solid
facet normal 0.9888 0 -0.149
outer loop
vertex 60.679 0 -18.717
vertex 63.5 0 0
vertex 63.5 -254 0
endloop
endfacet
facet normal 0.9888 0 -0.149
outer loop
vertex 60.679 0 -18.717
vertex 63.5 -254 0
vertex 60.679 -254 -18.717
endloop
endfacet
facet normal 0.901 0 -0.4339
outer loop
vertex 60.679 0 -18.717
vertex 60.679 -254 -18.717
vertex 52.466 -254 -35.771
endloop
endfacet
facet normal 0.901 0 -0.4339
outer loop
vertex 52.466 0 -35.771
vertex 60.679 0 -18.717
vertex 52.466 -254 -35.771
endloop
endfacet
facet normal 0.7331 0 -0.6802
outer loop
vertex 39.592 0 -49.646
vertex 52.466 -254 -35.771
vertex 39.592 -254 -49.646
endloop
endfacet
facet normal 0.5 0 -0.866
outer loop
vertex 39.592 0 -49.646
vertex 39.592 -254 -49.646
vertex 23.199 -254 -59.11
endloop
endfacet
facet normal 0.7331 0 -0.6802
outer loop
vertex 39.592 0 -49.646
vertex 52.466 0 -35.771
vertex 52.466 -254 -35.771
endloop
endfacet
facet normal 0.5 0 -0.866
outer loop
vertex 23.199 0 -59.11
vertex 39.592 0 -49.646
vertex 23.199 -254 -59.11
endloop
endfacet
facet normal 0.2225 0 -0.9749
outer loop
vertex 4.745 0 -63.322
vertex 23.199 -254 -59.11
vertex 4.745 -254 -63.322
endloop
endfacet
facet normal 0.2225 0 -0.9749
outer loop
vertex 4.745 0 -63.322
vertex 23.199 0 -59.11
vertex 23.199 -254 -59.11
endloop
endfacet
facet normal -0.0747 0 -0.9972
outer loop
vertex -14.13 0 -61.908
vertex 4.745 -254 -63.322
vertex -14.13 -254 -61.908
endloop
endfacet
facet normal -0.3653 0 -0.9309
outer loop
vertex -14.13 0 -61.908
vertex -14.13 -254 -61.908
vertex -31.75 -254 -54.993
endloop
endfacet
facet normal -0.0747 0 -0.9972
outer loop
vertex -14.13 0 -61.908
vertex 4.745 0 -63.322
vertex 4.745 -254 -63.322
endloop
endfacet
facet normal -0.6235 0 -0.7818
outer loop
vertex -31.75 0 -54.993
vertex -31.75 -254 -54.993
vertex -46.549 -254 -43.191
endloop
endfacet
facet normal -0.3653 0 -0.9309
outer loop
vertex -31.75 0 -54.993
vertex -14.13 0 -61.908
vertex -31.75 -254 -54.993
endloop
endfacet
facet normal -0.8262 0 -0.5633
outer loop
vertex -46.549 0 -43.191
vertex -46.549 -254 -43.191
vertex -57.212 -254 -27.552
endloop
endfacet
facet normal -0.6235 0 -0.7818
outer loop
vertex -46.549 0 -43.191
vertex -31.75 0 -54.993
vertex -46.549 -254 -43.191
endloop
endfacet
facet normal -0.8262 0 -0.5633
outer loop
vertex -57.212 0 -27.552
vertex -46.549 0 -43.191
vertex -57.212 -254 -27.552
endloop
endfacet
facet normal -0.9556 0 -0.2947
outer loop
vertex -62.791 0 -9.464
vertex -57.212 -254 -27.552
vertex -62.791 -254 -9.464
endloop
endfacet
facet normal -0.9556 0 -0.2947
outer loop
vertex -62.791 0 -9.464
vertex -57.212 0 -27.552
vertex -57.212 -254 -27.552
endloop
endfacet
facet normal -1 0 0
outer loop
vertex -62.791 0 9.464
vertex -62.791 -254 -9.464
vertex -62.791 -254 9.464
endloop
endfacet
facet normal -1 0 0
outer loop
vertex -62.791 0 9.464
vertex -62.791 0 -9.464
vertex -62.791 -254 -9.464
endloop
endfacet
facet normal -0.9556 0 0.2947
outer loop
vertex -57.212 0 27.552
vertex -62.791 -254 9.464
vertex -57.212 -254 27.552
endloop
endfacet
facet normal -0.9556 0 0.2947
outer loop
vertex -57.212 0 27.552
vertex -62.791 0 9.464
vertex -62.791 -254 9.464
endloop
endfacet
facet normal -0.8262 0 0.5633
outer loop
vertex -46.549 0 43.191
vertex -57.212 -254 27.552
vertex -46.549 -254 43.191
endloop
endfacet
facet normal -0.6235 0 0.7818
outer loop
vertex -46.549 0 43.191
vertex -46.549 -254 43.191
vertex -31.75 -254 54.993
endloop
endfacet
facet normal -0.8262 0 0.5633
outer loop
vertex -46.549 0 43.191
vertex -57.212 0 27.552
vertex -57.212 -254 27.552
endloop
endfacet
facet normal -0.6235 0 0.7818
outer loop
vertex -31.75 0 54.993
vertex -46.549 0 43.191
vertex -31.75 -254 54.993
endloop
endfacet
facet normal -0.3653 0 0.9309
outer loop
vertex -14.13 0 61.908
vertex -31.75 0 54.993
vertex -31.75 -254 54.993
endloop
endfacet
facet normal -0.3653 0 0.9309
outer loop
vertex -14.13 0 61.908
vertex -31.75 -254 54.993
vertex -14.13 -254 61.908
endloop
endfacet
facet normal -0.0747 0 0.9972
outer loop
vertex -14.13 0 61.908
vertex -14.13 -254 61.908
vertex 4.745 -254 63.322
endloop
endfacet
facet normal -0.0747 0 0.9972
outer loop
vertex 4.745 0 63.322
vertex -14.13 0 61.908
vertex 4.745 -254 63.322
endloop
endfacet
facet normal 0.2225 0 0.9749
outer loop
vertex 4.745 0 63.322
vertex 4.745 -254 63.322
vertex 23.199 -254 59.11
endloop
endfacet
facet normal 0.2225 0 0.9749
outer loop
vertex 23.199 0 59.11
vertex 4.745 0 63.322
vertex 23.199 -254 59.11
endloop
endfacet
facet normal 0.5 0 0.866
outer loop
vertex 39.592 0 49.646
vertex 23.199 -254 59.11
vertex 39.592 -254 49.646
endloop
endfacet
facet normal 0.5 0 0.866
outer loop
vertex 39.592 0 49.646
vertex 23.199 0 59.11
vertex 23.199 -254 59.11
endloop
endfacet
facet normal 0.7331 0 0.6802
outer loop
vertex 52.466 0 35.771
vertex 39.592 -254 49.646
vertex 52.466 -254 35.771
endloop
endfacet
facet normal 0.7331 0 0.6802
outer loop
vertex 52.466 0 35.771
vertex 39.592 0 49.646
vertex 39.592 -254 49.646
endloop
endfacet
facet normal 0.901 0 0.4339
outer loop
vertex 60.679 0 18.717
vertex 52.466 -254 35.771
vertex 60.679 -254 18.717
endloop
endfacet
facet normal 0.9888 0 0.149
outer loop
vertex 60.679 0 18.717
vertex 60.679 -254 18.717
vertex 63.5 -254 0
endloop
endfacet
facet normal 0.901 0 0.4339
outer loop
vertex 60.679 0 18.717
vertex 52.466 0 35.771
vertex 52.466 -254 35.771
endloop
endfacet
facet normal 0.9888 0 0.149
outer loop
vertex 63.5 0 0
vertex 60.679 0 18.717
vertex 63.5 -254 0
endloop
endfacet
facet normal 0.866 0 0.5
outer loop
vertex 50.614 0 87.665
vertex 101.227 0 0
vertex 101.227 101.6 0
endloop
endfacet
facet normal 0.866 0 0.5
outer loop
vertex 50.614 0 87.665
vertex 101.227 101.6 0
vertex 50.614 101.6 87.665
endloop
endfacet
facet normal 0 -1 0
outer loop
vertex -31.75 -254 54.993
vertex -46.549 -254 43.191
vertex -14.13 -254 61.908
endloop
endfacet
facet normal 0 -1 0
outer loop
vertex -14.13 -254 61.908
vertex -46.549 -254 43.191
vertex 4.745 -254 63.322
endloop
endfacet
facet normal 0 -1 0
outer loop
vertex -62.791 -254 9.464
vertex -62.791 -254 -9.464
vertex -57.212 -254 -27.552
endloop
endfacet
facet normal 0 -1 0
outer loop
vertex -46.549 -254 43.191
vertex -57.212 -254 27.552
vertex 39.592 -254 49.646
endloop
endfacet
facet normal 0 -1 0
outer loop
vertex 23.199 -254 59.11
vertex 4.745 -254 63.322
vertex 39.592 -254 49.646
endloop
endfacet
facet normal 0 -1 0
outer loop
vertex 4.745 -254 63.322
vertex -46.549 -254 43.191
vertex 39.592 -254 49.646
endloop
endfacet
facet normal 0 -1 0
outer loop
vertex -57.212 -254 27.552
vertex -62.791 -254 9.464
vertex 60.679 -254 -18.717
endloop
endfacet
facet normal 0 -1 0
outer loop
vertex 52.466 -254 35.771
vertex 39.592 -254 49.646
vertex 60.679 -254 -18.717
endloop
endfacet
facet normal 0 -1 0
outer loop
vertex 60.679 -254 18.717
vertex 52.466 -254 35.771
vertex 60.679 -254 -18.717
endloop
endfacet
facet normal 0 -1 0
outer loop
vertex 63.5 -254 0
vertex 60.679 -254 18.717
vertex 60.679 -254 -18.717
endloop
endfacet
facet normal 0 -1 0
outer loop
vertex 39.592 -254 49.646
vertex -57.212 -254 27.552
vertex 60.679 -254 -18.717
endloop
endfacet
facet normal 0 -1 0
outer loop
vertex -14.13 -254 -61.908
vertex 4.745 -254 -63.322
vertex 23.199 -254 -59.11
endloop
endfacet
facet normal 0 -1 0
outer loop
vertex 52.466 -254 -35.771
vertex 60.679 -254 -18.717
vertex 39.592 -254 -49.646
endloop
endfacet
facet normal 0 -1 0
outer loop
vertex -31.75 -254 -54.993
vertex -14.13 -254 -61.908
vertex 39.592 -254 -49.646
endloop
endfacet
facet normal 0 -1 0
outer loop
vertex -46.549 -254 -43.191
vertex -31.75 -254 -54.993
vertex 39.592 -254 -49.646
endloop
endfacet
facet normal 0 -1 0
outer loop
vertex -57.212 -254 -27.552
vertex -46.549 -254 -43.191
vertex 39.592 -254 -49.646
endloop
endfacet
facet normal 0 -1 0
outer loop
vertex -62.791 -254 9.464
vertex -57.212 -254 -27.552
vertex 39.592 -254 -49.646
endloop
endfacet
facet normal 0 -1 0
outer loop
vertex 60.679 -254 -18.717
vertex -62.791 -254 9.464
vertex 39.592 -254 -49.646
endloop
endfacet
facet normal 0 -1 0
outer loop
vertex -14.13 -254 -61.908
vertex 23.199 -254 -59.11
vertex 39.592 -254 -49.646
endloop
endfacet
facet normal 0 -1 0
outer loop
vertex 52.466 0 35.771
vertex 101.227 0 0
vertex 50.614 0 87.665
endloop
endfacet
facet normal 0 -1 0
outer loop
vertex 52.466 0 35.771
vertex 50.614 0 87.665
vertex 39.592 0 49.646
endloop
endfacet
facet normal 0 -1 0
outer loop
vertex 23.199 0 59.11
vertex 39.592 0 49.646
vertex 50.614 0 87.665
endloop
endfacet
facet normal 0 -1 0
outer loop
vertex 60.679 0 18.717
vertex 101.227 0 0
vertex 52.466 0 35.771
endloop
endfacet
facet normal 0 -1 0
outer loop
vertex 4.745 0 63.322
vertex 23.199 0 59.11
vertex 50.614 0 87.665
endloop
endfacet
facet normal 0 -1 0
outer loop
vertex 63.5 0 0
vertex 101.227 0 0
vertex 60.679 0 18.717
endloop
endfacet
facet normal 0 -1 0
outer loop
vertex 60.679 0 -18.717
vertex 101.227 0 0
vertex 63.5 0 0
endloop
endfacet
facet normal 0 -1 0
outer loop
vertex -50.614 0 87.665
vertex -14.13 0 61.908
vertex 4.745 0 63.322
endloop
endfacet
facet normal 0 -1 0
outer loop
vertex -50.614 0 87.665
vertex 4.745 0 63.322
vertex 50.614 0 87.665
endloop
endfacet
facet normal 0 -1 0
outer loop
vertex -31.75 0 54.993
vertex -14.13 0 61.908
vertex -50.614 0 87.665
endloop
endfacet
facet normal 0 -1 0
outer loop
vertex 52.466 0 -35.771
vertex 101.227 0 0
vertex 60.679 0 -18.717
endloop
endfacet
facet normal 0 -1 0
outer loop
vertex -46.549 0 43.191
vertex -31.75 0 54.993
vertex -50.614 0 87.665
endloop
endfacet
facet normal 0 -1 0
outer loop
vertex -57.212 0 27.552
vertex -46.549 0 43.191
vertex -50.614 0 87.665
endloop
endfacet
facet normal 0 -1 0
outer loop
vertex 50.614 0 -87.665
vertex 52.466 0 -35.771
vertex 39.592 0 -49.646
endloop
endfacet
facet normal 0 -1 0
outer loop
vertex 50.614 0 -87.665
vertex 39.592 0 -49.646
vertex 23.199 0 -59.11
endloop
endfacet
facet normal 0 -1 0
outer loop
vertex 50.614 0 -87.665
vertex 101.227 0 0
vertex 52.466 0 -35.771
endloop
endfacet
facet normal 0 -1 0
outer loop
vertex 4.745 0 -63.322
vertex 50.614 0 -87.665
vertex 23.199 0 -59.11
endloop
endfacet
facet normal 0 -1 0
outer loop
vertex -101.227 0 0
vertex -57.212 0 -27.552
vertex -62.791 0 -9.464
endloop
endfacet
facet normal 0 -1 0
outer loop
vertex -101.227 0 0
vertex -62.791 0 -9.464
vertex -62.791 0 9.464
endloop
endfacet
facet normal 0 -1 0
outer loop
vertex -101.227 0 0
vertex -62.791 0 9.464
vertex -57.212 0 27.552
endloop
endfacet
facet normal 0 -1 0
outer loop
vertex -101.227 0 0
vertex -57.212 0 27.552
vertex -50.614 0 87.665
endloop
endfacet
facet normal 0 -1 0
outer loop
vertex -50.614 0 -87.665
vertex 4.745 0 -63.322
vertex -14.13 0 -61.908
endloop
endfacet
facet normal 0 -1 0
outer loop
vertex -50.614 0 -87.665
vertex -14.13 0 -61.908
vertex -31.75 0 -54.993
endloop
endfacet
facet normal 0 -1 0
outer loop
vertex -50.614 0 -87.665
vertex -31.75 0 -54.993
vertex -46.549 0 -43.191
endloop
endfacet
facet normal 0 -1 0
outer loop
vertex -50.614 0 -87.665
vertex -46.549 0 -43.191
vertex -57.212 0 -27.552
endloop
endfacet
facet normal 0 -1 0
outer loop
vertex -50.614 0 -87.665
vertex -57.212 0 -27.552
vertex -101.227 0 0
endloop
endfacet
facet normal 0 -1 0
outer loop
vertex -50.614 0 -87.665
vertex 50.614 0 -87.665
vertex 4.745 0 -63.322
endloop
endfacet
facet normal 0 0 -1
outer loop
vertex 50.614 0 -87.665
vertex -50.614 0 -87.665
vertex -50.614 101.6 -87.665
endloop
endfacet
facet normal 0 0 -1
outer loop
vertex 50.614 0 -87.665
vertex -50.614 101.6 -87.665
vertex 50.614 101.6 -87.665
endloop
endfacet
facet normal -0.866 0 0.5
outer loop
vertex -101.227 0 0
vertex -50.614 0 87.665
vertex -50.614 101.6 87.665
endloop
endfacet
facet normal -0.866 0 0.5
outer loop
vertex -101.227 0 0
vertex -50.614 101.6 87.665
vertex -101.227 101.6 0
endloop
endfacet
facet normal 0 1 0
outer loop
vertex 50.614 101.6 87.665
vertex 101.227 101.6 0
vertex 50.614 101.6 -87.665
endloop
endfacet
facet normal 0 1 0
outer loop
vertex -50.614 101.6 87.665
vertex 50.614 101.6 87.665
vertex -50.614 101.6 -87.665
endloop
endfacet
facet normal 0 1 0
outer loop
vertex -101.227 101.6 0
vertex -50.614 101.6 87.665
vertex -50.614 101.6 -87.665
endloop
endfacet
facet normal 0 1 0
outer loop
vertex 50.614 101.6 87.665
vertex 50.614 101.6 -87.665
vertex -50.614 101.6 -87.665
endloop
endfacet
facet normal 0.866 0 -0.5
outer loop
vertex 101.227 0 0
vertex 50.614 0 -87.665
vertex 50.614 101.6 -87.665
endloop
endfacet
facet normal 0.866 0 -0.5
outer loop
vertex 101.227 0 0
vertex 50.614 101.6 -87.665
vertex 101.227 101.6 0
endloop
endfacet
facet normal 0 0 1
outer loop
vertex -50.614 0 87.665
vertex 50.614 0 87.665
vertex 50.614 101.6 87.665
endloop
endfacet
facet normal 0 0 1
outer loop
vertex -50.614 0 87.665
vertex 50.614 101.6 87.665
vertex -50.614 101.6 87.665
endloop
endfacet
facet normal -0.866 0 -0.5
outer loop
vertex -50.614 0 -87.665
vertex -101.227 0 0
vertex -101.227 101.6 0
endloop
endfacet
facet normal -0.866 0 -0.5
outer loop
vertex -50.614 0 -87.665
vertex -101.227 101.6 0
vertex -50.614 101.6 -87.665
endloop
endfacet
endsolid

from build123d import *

# Parameters (mm, degrees)
SKETCH1_R           = 63.5
BOSS_EXTRUDE1_DEPTH = 254
BOSS_EXTRUDE2_DEPTH = 101.6


with BuildPart() as part:
    # Sketch1 → Boss-Extrude1 (new body)
    with BuildSketch(Plane(origin=(0, 0, 0), x_dir=(1, 0, 0), z_dir=(0, 1, 0))):
        Circle(SKETCH1_R)
    extrude(amount=-BOSS_EXTRUDE1_DEPTH)

    # Sketch2 → Boss-Extrude2 (add)
    with BuildSketch(Plane(origin=(0, 0, 0), x_dir=(1, 0, 0), z_dir=(0, 1, 0))):
        Polygon((-50.613670356, 87.665448614), (50.613670356, 87.665448614), (101.227340712, 0), (50.613670356, -87.665448614), (-50.613670356, -87.665448614), (-101.227340712, 0), align=None)
    extrude(amount=BOSS_EXTRUDE2_DEPTH)


solid = part.part
